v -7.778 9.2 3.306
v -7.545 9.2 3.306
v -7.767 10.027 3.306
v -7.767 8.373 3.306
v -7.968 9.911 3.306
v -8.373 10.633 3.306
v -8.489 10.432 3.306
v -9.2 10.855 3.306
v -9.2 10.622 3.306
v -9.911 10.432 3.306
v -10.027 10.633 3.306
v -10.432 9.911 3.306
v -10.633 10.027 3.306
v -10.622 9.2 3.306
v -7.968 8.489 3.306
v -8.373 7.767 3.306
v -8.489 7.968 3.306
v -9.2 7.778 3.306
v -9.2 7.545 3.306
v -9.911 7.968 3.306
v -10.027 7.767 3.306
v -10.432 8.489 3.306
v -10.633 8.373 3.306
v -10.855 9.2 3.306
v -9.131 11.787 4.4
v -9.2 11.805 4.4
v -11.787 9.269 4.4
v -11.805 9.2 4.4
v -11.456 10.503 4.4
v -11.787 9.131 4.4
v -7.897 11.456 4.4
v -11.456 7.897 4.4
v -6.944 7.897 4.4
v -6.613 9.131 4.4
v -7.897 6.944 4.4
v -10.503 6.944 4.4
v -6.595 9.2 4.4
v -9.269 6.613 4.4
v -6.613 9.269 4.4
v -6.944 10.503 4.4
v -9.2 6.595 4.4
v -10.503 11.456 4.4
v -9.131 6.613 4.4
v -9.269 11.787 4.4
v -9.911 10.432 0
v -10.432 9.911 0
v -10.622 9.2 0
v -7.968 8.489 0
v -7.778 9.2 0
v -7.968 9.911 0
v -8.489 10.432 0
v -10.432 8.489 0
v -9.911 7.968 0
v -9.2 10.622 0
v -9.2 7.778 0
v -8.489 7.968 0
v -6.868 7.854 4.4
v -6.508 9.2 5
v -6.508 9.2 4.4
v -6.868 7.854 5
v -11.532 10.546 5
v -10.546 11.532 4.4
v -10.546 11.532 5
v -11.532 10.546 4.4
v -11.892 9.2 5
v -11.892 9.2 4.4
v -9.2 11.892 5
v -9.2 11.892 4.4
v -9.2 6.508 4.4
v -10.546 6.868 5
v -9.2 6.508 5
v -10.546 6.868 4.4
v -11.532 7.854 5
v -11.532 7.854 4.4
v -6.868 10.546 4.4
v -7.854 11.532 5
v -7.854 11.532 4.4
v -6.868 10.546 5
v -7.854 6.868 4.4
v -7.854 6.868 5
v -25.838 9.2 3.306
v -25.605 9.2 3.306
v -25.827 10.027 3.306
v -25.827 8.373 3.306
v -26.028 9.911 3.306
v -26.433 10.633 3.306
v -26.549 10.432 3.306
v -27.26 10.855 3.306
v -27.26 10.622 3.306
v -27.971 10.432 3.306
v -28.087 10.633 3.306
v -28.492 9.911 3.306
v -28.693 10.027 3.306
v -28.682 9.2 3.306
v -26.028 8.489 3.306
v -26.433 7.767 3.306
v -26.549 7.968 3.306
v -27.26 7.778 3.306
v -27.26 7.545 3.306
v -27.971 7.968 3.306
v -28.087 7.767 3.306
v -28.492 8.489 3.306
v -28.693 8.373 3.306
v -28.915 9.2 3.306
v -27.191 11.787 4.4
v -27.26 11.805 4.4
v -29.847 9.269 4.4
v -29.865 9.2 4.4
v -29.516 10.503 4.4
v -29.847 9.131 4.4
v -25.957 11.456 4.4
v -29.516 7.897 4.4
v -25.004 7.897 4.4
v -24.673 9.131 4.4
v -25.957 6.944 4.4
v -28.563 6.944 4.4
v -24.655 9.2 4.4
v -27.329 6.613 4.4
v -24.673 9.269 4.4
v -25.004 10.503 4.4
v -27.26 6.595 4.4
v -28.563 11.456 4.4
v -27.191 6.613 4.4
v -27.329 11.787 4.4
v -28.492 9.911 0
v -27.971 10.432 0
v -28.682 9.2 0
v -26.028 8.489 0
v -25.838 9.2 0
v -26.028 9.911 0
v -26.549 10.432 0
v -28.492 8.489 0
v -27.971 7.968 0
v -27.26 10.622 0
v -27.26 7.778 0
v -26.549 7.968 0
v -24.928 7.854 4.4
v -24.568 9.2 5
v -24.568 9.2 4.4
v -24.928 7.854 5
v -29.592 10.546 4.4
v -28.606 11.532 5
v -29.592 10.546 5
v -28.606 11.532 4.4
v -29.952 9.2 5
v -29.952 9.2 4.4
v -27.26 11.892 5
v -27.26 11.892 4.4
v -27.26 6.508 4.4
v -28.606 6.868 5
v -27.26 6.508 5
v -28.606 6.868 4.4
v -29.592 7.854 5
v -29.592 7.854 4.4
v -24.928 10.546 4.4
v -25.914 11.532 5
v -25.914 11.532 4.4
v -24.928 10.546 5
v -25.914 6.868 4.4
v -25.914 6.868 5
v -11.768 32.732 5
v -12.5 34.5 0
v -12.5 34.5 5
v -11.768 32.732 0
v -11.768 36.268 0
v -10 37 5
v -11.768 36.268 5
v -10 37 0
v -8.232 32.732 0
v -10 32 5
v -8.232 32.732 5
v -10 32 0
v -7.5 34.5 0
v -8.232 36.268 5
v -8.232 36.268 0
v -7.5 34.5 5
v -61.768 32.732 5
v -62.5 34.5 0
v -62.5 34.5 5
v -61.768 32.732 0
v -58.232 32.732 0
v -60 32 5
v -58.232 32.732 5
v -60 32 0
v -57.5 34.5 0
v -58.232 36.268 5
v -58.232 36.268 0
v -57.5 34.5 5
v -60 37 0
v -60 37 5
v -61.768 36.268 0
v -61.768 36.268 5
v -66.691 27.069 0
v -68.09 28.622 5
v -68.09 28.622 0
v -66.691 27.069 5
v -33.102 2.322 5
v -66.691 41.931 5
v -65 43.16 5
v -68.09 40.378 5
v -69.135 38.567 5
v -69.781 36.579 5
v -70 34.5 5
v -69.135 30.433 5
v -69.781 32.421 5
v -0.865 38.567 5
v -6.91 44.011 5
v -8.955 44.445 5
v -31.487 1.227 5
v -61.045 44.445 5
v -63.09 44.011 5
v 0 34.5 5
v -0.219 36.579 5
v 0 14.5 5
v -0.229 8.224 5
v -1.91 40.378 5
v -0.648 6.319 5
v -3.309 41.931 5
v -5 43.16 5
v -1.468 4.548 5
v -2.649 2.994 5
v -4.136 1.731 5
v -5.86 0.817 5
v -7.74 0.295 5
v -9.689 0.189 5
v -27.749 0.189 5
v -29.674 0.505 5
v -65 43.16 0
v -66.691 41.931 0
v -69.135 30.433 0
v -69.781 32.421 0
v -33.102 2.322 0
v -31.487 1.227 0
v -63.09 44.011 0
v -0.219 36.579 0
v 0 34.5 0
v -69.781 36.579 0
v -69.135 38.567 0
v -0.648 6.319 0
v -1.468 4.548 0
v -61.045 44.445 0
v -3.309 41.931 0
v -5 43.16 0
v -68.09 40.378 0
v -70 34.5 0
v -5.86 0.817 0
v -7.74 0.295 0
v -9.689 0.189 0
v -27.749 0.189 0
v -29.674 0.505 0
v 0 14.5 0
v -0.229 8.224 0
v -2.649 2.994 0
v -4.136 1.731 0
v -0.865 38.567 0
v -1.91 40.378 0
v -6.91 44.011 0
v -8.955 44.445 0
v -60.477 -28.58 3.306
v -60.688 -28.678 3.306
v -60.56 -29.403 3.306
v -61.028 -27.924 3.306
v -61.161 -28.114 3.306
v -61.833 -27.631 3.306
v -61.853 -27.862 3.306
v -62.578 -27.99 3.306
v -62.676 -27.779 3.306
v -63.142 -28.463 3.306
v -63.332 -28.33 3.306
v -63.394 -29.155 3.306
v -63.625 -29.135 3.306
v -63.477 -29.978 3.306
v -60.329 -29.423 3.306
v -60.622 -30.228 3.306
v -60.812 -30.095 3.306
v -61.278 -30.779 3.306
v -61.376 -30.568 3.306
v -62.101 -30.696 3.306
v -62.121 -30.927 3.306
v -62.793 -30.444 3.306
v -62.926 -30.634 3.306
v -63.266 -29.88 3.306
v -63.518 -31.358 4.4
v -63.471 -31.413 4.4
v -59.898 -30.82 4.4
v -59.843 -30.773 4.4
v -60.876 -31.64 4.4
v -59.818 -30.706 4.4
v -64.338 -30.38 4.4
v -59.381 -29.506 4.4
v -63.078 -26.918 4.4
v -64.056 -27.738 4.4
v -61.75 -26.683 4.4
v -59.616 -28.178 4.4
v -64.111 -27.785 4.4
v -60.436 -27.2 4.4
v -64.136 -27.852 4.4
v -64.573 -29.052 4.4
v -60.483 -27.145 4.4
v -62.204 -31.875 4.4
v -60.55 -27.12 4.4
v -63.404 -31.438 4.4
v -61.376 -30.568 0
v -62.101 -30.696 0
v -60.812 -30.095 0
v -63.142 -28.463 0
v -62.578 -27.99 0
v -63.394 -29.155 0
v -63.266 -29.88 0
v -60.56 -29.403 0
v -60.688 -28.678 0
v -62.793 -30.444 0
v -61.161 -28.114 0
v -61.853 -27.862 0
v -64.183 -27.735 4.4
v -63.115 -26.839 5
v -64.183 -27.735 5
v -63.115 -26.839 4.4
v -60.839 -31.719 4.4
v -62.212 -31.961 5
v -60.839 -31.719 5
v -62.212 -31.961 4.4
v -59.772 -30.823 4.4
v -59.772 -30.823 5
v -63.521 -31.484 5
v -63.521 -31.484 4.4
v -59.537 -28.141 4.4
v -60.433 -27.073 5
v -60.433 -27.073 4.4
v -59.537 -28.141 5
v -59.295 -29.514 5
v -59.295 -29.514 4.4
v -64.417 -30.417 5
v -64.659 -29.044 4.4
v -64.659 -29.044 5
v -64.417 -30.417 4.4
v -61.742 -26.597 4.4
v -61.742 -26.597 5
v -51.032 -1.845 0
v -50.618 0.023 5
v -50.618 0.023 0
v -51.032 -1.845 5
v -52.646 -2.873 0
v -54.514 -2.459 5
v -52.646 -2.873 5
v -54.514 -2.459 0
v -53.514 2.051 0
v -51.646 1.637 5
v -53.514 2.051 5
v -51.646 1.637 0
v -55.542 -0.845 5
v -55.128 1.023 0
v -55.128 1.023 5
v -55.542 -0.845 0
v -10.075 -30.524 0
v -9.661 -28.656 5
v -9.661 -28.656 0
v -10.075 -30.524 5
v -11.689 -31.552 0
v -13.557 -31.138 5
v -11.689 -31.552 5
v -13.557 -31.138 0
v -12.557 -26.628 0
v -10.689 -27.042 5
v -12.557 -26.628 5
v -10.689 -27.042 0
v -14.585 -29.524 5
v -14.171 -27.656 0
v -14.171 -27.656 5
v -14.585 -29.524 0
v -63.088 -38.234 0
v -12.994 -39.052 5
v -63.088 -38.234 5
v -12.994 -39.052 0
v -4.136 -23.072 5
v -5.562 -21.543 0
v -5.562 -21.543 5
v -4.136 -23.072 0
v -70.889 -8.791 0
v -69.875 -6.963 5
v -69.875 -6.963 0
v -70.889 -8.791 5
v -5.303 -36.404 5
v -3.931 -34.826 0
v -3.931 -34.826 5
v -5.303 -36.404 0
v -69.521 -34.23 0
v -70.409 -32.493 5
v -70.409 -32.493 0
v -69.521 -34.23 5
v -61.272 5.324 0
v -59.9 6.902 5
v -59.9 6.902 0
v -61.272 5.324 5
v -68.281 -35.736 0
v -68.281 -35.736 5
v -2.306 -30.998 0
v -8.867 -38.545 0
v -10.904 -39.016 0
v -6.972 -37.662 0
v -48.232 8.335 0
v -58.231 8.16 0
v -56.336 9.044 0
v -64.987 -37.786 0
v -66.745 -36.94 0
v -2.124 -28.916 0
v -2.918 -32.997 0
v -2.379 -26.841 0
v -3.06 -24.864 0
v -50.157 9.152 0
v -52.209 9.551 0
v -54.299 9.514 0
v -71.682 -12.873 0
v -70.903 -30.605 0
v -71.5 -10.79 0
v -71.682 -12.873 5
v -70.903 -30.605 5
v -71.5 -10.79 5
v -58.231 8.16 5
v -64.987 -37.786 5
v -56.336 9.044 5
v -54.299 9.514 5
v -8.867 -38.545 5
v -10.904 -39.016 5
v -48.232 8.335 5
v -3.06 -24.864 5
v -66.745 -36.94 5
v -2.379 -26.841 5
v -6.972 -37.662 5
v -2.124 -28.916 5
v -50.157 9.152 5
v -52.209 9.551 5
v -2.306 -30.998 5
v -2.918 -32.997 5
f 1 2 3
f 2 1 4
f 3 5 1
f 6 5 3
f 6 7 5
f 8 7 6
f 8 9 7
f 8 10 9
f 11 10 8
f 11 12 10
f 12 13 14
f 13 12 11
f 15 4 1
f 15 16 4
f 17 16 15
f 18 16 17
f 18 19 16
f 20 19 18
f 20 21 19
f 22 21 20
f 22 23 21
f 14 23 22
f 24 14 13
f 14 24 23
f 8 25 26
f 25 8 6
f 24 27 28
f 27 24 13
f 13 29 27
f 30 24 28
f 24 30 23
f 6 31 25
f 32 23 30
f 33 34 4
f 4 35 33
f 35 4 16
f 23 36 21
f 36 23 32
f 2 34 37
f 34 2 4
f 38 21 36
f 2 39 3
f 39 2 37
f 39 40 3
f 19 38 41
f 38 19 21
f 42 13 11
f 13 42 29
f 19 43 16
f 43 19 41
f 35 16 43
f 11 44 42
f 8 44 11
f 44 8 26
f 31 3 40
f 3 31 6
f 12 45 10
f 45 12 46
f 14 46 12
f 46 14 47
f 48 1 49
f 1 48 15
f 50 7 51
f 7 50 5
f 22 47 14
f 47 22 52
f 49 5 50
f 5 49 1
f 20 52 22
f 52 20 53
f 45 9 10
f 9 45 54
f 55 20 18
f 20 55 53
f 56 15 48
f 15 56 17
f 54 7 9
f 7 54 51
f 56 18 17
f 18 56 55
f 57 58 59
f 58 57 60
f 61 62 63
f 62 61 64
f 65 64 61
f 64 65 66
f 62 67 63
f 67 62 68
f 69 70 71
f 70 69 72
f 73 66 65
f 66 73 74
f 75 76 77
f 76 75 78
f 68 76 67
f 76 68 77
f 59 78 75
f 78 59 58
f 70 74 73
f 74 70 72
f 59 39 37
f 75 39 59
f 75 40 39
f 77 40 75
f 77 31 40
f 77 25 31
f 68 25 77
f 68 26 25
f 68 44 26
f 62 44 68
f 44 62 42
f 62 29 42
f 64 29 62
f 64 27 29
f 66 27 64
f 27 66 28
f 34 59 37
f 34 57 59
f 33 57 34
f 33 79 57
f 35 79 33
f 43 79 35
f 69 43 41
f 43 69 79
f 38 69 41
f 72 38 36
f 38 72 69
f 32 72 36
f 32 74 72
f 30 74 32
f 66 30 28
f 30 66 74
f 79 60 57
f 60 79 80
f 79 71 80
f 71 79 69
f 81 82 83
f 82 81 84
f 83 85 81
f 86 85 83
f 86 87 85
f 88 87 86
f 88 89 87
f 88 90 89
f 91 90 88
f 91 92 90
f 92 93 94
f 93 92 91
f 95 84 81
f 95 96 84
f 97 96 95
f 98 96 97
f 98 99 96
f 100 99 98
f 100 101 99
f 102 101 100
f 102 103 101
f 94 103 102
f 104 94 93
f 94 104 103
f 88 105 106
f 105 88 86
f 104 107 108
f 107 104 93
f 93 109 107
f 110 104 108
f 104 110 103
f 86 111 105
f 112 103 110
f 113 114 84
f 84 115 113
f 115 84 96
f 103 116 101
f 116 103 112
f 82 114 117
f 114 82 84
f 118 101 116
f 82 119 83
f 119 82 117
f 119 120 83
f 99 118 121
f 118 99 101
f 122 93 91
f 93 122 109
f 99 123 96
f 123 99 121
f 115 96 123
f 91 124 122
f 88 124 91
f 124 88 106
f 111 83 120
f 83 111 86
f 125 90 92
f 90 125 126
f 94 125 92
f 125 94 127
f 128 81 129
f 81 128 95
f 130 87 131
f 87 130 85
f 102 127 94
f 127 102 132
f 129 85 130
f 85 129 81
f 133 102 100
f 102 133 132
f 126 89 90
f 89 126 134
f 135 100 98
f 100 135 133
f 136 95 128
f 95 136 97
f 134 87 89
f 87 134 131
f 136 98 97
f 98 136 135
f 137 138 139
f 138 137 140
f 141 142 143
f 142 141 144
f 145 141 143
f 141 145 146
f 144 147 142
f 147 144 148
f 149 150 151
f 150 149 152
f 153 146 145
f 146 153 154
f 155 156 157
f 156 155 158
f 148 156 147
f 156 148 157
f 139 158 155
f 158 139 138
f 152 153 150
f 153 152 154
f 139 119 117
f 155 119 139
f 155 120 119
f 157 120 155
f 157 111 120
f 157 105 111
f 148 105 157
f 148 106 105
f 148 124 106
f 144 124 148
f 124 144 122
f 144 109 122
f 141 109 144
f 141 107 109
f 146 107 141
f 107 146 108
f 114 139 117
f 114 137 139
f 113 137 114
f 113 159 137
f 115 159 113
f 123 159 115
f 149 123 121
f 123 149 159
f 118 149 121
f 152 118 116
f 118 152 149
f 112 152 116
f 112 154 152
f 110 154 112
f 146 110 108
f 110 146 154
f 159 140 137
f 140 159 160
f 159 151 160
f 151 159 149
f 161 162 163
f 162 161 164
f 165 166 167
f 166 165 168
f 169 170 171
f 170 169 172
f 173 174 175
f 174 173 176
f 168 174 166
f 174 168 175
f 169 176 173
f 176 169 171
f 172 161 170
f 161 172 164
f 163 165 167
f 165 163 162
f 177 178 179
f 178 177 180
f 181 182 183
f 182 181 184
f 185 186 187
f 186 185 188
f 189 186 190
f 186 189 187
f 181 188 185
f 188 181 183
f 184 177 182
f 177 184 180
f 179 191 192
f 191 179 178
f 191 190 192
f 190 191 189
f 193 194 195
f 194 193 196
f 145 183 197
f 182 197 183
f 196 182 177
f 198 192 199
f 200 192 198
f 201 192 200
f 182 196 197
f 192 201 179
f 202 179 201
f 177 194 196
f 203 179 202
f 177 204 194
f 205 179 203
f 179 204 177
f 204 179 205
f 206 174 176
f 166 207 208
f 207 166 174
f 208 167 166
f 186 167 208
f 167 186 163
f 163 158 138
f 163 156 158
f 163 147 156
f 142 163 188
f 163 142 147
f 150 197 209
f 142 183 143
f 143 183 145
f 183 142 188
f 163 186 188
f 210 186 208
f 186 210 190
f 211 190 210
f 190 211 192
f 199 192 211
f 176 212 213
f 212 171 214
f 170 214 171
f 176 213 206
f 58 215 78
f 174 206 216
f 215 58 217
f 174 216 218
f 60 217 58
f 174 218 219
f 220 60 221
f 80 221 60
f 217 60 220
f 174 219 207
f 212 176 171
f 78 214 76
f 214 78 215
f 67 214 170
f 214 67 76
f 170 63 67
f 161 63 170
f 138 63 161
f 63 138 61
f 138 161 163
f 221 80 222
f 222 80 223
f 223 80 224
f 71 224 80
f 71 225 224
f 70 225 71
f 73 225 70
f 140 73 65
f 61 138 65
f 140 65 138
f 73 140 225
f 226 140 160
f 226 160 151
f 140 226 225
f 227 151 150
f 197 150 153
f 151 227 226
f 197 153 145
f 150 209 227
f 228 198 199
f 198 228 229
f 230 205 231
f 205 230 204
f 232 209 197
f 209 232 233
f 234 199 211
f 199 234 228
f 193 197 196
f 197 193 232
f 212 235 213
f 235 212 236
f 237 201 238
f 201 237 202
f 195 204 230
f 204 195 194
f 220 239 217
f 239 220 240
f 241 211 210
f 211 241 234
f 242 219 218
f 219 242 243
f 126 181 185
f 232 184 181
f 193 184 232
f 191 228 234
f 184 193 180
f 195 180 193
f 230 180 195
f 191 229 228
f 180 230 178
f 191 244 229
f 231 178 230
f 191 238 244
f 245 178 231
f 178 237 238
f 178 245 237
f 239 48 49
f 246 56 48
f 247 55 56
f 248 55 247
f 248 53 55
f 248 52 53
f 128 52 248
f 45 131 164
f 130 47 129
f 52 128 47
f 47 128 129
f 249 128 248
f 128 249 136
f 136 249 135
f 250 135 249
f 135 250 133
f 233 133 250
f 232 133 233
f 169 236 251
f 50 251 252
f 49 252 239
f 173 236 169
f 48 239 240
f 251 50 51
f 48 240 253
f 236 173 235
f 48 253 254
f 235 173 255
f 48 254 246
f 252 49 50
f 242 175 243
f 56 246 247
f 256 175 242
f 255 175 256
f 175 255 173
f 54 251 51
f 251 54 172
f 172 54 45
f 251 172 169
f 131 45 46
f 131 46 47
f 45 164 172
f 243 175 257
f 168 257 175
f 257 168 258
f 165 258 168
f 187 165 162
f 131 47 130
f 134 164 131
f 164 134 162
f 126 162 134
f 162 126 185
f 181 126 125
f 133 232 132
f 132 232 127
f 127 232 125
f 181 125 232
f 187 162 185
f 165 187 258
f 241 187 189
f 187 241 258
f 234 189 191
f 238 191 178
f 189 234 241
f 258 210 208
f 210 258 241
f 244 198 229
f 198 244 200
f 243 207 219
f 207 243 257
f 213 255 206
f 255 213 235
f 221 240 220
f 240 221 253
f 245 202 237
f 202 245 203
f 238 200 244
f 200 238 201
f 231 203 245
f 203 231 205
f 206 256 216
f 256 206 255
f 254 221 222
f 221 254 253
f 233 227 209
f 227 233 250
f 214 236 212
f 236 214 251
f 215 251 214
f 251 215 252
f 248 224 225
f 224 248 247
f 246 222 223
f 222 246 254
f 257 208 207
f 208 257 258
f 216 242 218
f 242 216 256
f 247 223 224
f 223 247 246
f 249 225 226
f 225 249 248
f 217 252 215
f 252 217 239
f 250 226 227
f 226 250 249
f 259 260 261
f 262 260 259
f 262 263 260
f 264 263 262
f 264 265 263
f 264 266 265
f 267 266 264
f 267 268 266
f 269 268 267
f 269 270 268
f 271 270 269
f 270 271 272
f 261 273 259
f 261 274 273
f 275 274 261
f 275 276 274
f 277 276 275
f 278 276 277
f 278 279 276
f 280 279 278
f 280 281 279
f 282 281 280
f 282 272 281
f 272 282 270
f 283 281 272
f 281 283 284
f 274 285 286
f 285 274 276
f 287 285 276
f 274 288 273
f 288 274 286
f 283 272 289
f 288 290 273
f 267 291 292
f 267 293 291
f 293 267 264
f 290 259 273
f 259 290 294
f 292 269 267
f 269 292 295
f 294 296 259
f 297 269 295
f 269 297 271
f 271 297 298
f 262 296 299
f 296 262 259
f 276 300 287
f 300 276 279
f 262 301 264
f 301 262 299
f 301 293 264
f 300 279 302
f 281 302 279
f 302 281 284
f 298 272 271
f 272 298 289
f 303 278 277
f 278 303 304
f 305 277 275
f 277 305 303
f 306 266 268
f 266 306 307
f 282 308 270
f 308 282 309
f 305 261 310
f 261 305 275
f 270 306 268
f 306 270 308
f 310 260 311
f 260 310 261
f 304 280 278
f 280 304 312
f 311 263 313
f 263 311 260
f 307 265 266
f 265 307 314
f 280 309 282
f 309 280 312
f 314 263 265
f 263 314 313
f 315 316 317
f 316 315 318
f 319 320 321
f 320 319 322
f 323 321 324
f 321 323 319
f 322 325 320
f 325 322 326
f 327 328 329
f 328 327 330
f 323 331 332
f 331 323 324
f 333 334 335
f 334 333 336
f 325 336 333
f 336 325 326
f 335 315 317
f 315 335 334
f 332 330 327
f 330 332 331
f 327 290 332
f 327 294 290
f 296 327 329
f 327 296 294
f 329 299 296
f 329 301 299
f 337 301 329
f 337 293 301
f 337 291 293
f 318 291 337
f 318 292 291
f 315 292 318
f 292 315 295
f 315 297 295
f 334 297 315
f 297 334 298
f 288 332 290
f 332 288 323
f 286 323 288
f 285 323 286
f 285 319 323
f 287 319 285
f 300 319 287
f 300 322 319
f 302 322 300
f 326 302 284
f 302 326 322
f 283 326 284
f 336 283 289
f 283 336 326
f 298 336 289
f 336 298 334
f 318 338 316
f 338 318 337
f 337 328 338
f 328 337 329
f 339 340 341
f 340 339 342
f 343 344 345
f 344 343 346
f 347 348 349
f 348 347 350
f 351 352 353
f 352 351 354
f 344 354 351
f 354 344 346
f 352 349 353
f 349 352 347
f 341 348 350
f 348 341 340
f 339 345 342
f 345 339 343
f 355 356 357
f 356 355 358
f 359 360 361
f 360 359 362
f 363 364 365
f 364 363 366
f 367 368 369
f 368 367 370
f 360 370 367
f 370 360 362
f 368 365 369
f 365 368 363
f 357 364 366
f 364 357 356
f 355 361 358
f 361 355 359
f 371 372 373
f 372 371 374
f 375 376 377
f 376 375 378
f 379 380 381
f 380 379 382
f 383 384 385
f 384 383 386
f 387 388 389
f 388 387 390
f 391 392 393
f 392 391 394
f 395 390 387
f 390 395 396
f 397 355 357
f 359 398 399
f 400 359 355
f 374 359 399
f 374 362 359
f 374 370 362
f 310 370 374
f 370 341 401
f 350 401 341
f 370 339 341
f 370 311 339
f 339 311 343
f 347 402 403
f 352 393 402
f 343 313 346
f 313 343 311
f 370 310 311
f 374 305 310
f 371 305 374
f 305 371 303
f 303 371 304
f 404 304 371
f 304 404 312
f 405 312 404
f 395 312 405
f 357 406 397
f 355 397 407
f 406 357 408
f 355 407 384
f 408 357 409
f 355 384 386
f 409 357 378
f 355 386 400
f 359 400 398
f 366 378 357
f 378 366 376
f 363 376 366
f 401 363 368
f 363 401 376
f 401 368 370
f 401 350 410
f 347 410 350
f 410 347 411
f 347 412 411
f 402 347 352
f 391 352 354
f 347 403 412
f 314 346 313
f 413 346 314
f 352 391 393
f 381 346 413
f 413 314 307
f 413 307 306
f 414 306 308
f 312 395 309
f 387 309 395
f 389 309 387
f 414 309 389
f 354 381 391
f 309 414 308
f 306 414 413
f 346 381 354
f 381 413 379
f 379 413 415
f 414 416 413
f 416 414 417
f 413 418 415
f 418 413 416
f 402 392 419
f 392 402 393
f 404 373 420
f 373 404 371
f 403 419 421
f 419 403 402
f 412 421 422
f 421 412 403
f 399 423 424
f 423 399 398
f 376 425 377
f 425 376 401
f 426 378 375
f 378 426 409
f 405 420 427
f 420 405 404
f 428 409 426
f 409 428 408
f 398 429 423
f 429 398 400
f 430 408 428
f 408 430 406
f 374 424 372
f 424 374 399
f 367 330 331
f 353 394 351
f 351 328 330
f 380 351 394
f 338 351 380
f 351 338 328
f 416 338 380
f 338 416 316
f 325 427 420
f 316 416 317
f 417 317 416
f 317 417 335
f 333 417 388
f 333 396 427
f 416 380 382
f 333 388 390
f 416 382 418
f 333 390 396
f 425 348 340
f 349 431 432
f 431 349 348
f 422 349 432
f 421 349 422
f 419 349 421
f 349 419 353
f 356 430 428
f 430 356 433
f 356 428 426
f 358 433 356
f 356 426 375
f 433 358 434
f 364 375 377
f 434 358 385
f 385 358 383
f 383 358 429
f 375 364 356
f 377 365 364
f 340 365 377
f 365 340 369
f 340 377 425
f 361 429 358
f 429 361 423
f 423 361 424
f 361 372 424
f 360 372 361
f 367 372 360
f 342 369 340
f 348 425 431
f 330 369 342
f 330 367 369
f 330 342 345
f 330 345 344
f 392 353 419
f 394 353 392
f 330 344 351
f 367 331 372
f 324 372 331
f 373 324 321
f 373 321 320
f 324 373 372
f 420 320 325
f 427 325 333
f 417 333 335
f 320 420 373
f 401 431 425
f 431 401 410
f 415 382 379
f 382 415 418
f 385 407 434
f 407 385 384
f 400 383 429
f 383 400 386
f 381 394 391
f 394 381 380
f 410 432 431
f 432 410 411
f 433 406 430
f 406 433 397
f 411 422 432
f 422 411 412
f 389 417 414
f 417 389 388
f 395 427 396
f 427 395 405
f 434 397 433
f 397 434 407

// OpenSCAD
t=5;
separation=145;
side_holes = [[19.27, 22.25], [9.2, 139.2], [9.2+18.06, 139.2]];
hole_d = .12*25.4;
hole_clear=11/2+1;
hole_w=7.5;
hole_inset=.5;
ps_l=158;

module flathead4_40(l=10, over=10){
hh = .047*25.4;
hd = .212*25.4;
ha = 82;
sd = .112*25.4;

	union(){
		cylinder(r1=hd/2, r2=hd/2 - hh*tan(ha/2), h=hh, $fn=12);
		cylinder(r=sd/2, h=l, $fn=12);
		if (over)
			translate([0,0,-over])
			cylinder(r=hd/2, h=over+.1, $fn=12);
	}
}


module power_supply_bracket1(){
	difference(){
		hull(){
			translate([t,side_holes[0][1],side_holes[0][0]])
			rotate([0,-90,0])	
			cylinder(r=hole_w+hole_d/2, h=t);

			translate([0,-hole_clear,0]){
				translate([0,0,10])
				rotate([0,90,0])	
				cylinder(r=hole_w+5/2, h=t);

				translate([0,0,10+50])
				rotate([0,90,0])	
				cylinder(r=hole_w+5/2, h=t);

				translate([0,15,10])//fake hole ust to put a flat spot on the bottom
				rotate([0,90,0])	
				cylinder(r=hole_w+5/2, h=t);
			}

		}
		translate([t-hole_inset,side_holes[0][1],side_holes[0][0]])
		rotate([0,-90,0])	
		flathead4_40(l=t+1, over=hole_inset+1);

		translate([0,-hole_clear,0]){
			translate([0,0,10])
			rotate([0,90,0])	
			cylinder(r=5/2, h=100, center=true);

			translate([0,0,10+50])
			rotate([0,90,0])	
			cylinder(r=5/2, h=100, center=true);
		}
	}

}

module power_supply_bracket2(){

	difference(){
		hull(){
			translate([t,side_holes[1][1],side_holes[1][0]])
			rotate([0,-90,0])	
			cylinder(r=hole_w+hole_d/2, h=t);

			translate([t,side_holes[2][1],side_holes[2][0]])
			rotate([0,-90,0])	
			cylinder(r=hole_w+hole_d/2, h=t);

			translate([0,ps_l+hole_clear,0]){
				translate([0,0,10])
				rotate([0,90,0])	
				cylinder(r=hole_w+5/2, h=t);

				translate([0,0,10+50])
				rotate([0,90,0])	
				cylinder(r=hole_w+5/2, h=t);

				translate([0,-20,10])//fake hole ust to put a flat spot on the bottom
				rotate([0,90,0])	
				cylinder(r=hole_w+5/2, h=t);
			}
		}

		translate([t-hole_inset,side_holes[1][1],side_holes[1][0]])
		rotate([0,-90,0])	
		flathead4_40(l=t+1, over=hole_inset+1);

		translate([t-hole_inset,side_holes[2][1],side_holes[2][0]])
		rotate([0,-90,0])	
		flathead4_40(l=t+1, over=hole_inset+1);

		translate([0,ps_l+hole_clear,0]){
			translate([0,0,10])
			rotate([0,90,0])	
			cylinder(r=5/2, h=100, center=true);

			translate([0,0,10+50])
			rotate([0,90,0])	
			cylinder(r=5/2, h=100, center=true);
		}
	}
}

translate([0,-130,0])
rotate([0,-90,0])
power_supply_bracket2();
translate([-65,0,0])
rotate([145,-90,0])
power_supply_bracket1();
